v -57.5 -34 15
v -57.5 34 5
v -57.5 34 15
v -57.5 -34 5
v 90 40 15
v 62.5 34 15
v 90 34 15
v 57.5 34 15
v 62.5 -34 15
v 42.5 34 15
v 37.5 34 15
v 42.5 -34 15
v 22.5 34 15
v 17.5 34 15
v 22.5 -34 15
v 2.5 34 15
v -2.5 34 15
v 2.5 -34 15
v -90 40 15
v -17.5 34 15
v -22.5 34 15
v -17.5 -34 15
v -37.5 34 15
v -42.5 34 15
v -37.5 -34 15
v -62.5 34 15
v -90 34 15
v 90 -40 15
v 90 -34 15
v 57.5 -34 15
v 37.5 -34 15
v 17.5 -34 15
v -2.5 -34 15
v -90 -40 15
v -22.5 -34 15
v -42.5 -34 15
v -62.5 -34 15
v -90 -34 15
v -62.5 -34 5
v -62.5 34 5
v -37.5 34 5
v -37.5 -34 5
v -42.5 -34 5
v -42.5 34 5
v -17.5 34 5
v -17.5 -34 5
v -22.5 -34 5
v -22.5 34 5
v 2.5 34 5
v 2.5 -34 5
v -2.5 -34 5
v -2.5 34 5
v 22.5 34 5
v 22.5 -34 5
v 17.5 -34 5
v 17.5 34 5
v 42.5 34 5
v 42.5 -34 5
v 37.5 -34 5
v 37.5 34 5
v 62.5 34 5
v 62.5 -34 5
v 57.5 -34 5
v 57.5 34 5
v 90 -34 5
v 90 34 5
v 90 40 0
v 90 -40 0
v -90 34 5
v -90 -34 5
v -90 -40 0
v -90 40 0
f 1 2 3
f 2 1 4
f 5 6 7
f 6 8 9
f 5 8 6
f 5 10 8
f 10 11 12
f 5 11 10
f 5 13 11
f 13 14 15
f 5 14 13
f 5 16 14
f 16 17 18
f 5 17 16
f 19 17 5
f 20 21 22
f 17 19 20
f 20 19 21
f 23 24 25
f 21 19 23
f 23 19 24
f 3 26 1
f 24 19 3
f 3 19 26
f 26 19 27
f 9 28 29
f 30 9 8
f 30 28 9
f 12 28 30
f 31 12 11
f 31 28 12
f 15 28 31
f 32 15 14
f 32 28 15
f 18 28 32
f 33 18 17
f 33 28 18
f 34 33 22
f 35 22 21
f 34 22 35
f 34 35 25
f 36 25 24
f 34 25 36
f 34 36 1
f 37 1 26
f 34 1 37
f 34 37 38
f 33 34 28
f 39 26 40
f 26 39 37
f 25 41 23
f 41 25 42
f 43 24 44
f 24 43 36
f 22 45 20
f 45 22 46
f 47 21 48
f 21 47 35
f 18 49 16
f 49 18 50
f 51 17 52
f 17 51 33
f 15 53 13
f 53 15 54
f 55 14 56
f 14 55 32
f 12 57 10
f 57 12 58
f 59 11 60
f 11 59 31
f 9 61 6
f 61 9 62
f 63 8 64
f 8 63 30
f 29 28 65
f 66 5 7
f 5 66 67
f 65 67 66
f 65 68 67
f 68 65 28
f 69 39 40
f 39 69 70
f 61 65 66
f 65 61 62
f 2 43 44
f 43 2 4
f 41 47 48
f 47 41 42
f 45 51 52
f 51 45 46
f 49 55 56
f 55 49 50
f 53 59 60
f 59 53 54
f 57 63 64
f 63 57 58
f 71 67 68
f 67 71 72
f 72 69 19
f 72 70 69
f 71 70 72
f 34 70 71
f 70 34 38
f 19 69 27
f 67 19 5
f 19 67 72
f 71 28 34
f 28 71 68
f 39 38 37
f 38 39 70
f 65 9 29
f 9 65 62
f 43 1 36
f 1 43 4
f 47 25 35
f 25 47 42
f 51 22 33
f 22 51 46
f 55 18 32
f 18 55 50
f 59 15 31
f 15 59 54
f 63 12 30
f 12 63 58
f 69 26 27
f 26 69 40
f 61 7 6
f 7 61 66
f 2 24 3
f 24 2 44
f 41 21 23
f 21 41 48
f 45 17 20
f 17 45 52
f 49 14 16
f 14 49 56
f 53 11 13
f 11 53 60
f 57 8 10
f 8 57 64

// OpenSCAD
$fn = 32;

// ----------------------------------------------------------------------
// Rib frame 180 x 80 x 15
// 7 ribs at 20 mm pitch
// ----------------------------------------------------------------------

// --- parameters (mm) ---
frame = [180, 80, 5];  // base plate size (x, y, z)
rail_w = 6;            // side rail width
ribs = 7;              // number of ribs
rib_t = 5;             // rib thickness
rib_h = 10;            // rib height above the base plate
pitch = 20;            // pitch between rib centres

// --- derived feature positions (mm) ---
span = (ribs - 1) * pitch;          // = 120   distance between the outer ribs
origin_x = -span / 2;               // = -60   X of the first rib
rib_len = frame[1] - 2 * rail_w + 2;  // = 70   rib length, 1 mm into each rail
feature_centers = [
  [origin_x + 0 * pitch, 0],
  [origin_x + 1 * pitch, 0],
  [origin_x + 2 * pitch, 0],
  [origin_x + 3 * pitch, 0],
  [origin_x + 4 * pitch, 0],
  [origin_x + 5 * pitch, 0],
  [origin_x + 6 * pitch, 0]
];   // rib centre line, drives the rib loop

// base plate, two side rails, then the ribs read straight off feature_centers
union() {
  translate([-frame[0] / 2, -frame[1] / 2, 0]) cube(frame);
  translate([-frame[0] / 2, -frame[1] / 2, 0]) cube([frame[0], rail_w, frame[2] + rib_h]);
  translate([-frame[0] / 2, frame[1] / 2 - rail_w, 0]) cube([frame[0], rail_w, frame[2] + rib_h]);
  for (centre = feature_centers)
    translate([centre[0] - rib_t / 2, centre[1] - rib_len / 2, frame[2] - 1])
      cube([rib_t, rib_len, rib_h + 1]);
}
